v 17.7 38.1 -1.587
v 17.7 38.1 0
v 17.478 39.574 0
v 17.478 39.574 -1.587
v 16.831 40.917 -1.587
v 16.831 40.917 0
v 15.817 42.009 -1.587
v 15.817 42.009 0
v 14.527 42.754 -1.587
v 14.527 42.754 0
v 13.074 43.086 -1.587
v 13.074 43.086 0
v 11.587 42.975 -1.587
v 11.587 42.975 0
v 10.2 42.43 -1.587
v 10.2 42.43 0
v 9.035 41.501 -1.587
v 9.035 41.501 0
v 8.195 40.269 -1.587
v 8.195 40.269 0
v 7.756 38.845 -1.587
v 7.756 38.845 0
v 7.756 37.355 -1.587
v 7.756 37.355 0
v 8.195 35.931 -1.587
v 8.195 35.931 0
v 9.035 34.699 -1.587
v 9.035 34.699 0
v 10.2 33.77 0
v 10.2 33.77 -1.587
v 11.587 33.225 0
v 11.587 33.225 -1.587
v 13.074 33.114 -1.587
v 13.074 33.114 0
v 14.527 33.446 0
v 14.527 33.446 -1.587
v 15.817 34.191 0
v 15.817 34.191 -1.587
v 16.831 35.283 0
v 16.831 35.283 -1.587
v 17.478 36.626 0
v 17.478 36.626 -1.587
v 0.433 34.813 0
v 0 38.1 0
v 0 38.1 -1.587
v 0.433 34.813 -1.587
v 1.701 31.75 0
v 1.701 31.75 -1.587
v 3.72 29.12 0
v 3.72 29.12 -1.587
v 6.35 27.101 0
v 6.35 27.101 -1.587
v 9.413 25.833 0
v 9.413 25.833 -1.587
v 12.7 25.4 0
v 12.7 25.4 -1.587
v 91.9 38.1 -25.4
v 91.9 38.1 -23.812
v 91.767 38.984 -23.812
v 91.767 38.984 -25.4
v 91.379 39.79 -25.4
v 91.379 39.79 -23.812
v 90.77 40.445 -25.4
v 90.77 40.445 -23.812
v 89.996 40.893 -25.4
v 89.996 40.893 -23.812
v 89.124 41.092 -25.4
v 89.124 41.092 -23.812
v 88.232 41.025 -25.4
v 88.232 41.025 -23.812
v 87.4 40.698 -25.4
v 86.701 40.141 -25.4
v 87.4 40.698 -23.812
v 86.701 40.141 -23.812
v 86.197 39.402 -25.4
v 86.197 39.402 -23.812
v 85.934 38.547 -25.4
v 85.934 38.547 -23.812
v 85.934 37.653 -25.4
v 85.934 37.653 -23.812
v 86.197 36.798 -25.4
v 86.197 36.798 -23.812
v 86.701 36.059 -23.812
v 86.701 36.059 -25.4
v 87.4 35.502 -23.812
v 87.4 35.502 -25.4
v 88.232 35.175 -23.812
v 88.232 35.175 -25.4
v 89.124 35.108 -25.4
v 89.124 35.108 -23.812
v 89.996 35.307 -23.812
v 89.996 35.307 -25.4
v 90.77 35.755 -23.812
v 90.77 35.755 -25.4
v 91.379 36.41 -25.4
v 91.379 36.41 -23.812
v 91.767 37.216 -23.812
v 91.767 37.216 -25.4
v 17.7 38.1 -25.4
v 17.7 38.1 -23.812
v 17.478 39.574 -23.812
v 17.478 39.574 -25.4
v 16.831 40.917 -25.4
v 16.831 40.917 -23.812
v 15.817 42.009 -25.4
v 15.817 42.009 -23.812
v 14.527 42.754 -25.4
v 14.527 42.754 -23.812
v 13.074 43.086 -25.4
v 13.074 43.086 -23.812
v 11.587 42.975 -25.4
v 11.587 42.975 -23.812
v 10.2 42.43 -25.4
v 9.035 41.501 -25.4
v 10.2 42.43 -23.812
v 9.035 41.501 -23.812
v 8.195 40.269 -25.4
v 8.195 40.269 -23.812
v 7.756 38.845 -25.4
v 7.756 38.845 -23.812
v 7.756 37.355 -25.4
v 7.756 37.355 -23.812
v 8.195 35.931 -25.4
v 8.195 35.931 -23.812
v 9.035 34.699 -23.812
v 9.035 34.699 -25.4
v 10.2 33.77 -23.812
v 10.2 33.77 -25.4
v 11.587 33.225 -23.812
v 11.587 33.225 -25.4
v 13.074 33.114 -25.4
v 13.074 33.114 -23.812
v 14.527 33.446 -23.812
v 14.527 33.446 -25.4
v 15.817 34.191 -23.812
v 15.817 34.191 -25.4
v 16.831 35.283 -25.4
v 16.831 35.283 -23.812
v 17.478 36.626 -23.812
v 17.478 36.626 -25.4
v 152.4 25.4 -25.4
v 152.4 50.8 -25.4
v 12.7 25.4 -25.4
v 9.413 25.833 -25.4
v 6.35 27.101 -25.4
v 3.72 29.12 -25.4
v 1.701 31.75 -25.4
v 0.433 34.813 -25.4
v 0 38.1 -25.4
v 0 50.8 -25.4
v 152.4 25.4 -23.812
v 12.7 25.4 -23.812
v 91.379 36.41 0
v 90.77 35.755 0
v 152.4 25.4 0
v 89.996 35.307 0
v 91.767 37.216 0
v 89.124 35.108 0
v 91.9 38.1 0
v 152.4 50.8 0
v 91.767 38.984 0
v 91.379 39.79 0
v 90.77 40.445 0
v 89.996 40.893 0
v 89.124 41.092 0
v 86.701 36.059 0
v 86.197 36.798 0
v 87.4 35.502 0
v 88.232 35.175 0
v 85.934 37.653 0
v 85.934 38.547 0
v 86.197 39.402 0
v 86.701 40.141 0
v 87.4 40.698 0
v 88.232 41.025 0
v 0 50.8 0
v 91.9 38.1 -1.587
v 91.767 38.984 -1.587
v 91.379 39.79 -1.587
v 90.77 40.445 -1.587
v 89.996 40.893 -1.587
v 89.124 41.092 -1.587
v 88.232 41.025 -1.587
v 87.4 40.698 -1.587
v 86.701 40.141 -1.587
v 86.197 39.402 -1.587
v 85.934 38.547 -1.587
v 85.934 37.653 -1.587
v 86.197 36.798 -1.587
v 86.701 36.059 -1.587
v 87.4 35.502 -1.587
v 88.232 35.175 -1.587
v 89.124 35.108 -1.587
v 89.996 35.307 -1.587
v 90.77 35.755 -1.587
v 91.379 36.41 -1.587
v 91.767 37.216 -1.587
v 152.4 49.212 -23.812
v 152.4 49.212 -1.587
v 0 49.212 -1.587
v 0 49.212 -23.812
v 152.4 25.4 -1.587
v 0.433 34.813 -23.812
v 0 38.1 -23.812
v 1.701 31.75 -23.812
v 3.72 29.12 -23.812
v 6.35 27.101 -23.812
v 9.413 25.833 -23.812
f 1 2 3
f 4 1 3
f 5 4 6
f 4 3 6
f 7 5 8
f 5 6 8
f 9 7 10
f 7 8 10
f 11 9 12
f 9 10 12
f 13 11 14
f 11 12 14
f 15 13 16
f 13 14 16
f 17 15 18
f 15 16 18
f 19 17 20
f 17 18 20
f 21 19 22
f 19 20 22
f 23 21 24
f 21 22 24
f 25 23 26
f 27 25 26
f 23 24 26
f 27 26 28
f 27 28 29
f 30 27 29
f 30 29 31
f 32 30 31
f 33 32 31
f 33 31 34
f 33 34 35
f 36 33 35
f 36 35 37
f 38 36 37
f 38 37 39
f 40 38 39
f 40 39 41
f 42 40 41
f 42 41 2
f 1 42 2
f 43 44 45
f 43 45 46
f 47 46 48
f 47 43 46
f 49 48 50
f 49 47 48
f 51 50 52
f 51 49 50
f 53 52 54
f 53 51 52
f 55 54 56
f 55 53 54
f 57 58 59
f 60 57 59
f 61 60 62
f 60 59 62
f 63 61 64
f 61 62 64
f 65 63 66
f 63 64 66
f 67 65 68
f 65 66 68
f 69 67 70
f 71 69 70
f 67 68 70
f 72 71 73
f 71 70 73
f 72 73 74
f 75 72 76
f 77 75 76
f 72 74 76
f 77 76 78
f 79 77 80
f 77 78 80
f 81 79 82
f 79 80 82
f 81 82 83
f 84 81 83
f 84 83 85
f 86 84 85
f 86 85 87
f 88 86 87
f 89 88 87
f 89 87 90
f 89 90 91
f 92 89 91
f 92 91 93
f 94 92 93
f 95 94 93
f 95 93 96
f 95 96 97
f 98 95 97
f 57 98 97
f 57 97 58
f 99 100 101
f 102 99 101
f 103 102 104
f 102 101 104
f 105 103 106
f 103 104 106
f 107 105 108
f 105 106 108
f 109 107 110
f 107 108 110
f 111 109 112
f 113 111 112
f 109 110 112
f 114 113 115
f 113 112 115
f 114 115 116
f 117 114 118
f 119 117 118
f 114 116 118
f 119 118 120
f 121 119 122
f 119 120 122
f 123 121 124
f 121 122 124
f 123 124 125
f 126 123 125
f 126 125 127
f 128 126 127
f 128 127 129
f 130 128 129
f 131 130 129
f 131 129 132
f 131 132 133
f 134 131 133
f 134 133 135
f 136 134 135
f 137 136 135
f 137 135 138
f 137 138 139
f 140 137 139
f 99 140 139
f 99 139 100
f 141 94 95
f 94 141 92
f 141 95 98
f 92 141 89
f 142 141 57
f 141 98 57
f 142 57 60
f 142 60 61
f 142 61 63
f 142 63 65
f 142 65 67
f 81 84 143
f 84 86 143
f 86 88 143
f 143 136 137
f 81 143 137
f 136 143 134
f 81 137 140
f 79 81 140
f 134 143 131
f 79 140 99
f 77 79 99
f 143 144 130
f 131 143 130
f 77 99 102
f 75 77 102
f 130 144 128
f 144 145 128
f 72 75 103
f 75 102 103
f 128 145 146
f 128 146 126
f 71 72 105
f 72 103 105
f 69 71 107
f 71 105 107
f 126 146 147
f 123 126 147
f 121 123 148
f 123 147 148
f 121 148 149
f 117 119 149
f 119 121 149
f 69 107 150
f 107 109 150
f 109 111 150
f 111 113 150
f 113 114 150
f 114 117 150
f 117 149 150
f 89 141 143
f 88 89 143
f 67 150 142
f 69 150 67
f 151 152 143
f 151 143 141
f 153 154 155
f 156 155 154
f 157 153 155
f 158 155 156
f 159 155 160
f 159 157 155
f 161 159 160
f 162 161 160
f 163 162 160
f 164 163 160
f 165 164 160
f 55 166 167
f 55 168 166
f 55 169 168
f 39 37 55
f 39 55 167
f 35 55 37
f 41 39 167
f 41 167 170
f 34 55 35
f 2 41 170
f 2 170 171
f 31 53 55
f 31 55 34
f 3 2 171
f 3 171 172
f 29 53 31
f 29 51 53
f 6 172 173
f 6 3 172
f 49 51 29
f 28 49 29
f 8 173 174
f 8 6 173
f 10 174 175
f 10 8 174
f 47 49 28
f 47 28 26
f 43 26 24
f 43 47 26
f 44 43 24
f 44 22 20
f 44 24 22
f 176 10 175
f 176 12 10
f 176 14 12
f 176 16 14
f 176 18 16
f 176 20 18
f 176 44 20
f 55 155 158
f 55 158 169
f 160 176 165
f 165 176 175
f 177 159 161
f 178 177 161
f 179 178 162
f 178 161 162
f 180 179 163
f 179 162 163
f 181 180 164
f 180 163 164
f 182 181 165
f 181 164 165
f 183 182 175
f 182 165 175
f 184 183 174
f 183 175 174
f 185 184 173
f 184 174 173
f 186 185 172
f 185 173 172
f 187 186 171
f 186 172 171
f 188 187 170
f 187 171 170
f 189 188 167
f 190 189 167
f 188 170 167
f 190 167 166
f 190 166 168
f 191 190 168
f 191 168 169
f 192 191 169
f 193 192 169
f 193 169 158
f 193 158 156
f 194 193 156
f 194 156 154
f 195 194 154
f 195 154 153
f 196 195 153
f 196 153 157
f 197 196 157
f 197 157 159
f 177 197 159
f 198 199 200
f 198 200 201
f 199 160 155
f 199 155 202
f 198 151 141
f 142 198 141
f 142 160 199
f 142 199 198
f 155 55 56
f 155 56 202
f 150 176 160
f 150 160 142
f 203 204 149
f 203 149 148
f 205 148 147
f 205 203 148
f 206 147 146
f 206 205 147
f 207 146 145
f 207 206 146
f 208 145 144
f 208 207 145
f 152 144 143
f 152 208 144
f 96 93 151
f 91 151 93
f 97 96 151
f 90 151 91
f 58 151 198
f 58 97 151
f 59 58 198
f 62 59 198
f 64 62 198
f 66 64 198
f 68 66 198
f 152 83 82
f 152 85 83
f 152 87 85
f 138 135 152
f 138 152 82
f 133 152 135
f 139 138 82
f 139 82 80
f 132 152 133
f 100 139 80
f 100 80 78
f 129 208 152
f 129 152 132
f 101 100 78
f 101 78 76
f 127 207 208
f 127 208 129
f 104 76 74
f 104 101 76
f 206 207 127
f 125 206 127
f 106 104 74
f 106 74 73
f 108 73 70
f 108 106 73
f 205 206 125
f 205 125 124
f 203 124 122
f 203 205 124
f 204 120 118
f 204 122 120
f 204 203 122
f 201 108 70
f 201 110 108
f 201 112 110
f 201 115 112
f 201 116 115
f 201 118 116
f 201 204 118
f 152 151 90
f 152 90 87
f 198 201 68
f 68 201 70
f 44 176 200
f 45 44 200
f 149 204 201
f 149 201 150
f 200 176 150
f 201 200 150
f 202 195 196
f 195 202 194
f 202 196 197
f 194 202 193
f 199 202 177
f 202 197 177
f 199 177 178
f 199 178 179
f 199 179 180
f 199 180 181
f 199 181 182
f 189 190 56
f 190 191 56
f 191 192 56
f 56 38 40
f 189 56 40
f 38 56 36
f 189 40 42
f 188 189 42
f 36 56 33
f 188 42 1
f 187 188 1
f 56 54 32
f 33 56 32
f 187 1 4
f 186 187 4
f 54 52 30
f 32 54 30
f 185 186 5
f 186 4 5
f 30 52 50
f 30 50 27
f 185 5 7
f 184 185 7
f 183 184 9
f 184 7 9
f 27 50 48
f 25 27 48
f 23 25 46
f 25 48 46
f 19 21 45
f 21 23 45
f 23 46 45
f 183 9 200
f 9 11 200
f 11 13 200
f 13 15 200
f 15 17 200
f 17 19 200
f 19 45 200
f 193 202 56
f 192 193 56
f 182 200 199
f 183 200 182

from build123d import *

# Parameters (mm, degrees)
SKETCH1_W           = 25.4
SKETCH1_H           = 50.8
SKETCH1_W_2         = 22.225
SKETCH1_H_2         = 47.625
BOSS_EXTRUDE1_DEPTH = 152.4
SKETCH2_R           = 5
SKETCH2_R_2         = 3
CUT_EXTRUDE1_DEPTH  = 152.4


with BuildPart() as part:
    # Sketch1 → Boss-Extrude1 (new body)
    with BuildSketch(Plane(origin=(0, 0, 0), x_dir=(0, 0, -1), z_dir=(1, 0, 0))):
        with Locations((12.7, 25.4)):
            Rectangle(SKETCH1_W, SKETCH1_H)
        with Locations((12.7, 25.4)):
            Rectangle(SKETCH1_W_2, SKETCH1_H_2, mode=Mode.SUBTRACT)
    extrude(amount=BOSS_EXTRUDE1_DEPTH)

    # Sketch2 → Cut-Extrude1 (cut)
    with BuildSketch(Plane.XY):
        with Locations((12.7, 38.1)):
            Circle(SKETCH2_R)
        with Locations((88.9, 38.1)):
            Circle(SKETCH2_R_2)
        with BuildLine():
            Line((12.7, 25.4), (152.4, 25.4))
            Line((152.4, 25.4), (152.4, 0))
            Line((152.4, 0), (0, 0))
            Line((0, 0), (0, 38.1))
            ThreePointArc((0, 38.1), (3.719743879, 29.119743879), (12.7, 25.4))
        make_face()
    extrude(amount=-CUT_EXTRUDE1_DEPTH, mode=Mode.SUBTRACT)


solid = part.part
